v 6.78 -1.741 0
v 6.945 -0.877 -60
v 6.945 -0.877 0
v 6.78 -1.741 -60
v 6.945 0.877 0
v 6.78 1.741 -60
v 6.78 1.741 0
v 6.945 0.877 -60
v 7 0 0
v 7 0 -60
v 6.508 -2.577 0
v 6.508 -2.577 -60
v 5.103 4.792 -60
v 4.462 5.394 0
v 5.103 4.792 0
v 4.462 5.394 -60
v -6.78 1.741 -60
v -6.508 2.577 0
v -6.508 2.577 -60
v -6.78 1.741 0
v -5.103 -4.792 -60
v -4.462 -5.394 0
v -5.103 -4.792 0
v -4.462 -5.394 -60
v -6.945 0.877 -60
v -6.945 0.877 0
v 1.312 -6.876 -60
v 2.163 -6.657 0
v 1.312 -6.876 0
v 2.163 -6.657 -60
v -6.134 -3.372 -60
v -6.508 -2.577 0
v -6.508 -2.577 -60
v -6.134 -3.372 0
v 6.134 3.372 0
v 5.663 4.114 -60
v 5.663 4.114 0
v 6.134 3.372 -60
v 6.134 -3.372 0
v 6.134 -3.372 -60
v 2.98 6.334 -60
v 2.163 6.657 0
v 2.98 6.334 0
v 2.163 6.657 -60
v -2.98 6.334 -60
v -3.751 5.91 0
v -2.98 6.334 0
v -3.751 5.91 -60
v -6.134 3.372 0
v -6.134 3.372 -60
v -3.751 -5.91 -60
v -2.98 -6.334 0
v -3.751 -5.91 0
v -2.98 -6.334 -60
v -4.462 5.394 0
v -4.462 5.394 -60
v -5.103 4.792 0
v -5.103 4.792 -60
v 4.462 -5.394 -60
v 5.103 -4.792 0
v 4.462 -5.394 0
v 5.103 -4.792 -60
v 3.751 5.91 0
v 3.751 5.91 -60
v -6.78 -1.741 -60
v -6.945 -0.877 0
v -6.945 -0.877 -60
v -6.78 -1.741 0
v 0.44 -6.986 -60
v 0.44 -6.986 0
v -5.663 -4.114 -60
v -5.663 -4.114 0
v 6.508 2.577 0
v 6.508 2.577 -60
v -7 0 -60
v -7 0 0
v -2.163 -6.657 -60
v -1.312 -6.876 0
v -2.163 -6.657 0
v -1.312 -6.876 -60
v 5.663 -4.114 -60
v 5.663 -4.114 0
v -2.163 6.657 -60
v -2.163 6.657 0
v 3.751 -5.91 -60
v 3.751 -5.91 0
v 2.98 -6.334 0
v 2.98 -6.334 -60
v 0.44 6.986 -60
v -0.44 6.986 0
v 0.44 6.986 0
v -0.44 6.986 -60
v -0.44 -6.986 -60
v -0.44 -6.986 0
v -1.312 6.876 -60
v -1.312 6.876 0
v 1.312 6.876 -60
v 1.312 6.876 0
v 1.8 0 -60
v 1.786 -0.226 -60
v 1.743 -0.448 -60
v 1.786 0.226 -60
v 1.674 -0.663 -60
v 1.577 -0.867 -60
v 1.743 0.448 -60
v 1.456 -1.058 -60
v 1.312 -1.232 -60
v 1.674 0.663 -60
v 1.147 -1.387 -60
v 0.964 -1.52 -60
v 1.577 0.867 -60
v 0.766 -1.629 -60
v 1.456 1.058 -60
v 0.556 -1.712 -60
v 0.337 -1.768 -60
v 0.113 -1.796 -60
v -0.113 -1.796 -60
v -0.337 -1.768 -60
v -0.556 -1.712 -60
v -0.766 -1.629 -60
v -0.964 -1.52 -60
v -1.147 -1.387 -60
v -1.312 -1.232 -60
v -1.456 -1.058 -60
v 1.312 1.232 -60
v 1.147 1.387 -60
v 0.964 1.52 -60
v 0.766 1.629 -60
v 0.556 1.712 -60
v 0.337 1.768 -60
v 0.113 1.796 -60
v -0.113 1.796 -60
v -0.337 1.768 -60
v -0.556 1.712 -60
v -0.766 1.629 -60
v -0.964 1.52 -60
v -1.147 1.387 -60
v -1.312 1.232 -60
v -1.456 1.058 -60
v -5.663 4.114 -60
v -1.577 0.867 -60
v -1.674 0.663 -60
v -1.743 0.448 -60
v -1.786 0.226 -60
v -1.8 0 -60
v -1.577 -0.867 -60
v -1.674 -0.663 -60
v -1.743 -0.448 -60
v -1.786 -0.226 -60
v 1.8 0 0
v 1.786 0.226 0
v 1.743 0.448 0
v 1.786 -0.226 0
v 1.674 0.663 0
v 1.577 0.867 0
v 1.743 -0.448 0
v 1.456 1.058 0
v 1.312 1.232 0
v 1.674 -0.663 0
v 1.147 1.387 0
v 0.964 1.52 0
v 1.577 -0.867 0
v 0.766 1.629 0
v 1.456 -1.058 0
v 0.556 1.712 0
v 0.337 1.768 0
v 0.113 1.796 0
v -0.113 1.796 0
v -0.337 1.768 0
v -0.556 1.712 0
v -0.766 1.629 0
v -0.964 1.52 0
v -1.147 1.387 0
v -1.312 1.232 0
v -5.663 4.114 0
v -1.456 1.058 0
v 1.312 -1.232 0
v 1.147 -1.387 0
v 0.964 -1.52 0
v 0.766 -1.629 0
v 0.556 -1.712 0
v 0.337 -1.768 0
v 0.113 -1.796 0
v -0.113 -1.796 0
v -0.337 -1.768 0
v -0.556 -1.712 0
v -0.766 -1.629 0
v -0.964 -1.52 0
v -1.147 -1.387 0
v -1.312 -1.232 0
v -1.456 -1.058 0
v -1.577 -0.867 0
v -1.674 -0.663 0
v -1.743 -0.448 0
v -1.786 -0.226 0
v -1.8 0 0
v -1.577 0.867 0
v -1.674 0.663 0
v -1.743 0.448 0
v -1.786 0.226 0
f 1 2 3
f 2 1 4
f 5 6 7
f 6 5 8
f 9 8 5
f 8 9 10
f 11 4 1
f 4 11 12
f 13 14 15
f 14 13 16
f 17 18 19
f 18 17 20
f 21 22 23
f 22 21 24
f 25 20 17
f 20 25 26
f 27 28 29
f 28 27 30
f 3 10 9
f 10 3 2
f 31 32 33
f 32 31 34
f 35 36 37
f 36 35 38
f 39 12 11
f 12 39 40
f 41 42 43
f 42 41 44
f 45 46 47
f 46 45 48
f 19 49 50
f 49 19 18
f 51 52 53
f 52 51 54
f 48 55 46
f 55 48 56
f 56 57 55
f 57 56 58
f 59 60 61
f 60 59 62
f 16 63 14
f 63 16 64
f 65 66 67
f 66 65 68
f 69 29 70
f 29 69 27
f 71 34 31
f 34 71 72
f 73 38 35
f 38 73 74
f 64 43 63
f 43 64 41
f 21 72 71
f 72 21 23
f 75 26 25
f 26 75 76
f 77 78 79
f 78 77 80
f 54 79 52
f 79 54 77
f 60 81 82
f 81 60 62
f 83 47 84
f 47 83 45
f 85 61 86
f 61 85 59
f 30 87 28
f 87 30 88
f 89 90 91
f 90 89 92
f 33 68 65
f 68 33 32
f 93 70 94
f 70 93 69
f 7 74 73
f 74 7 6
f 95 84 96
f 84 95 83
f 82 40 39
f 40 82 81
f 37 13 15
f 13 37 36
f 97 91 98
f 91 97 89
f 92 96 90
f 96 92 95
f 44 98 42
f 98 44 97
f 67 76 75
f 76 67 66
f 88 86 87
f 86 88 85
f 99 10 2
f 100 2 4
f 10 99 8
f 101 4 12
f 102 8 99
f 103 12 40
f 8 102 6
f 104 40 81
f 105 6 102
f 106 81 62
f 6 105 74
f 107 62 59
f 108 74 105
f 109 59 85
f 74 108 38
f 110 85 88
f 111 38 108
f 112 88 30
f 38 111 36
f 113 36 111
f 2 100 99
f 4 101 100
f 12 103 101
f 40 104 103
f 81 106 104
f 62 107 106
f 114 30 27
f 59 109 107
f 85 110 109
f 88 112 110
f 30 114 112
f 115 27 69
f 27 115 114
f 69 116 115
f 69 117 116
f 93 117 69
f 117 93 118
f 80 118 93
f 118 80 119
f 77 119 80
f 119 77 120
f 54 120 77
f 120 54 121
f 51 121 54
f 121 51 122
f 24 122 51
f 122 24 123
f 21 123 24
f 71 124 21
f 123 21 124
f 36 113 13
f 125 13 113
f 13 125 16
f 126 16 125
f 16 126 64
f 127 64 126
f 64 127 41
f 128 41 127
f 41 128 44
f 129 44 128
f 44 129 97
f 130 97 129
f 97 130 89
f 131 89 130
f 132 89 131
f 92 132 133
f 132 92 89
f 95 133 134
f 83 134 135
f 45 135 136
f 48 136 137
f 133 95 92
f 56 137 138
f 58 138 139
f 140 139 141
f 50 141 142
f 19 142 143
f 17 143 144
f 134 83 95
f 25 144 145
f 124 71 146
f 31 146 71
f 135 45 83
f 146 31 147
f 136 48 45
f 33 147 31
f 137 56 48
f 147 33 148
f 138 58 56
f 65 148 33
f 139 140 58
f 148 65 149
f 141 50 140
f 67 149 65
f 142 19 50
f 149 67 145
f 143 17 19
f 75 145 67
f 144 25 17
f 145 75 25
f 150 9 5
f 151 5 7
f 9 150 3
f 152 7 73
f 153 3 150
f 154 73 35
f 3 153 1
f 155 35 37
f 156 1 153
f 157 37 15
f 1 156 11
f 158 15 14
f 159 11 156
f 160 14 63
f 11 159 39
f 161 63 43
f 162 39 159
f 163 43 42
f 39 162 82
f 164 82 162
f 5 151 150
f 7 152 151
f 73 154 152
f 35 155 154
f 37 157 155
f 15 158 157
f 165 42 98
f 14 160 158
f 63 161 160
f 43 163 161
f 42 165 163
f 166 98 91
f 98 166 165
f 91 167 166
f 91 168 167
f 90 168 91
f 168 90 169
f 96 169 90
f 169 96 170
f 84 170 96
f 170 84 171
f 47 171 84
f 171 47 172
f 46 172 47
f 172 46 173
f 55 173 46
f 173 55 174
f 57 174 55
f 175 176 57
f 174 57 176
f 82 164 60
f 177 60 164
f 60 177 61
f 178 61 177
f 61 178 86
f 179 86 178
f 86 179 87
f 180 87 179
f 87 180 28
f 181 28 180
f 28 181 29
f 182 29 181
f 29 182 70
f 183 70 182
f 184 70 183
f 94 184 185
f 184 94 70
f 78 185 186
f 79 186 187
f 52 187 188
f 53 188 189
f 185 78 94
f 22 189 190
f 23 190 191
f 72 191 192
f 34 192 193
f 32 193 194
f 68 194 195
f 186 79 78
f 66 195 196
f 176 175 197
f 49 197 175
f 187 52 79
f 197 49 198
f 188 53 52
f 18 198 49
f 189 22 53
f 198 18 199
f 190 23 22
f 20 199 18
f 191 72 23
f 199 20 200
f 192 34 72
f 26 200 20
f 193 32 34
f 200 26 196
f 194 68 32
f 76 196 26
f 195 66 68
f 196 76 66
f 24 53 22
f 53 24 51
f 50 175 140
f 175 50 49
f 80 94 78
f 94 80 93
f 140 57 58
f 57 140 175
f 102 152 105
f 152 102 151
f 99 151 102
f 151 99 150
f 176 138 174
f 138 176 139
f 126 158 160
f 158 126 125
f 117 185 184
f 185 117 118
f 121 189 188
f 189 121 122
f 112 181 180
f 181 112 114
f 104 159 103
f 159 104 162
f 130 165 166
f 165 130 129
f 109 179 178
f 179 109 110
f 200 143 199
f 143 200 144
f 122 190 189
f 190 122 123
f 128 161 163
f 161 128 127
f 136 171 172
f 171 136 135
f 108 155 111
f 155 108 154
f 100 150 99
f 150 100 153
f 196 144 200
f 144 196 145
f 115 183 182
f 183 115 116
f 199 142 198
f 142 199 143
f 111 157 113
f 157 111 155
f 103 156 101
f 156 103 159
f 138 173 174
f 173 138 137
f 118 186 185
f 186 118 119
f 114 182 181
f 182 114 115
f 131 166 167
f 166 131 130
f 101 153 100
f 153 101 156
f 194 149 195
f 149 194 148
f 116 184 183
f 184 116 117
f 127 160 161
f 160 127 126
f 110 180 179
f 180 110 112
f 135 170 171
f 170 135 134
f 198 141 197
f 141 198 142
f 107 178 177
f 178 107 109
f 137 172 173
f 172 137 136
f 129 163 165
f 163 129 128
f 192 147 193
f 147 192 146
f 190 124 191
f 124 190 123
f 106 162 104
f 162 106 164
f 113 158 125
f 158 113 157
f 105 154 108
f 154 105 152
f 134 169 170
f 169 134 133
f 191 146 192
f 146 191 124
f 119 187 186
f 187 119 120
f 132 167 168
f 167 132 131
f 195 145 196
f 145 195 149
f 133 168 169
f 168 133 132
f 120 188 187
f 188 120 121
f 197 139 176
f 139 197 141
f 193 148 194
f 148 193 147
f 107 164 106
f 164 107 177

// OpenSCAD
$fn = 50;


difference() {
	union() {
		translate(v = [0, 0, -60.0000000000]) {
			cylinder(h = 60, r = 7.0000000000);
		}
		cylinder(h = 0, r = 17.0000000000);
	}
	union() {
		#translate(v = [0, 0, -60]) {
			cylinder(h = 60, r = 1.8000000000);
		}
	}
}
